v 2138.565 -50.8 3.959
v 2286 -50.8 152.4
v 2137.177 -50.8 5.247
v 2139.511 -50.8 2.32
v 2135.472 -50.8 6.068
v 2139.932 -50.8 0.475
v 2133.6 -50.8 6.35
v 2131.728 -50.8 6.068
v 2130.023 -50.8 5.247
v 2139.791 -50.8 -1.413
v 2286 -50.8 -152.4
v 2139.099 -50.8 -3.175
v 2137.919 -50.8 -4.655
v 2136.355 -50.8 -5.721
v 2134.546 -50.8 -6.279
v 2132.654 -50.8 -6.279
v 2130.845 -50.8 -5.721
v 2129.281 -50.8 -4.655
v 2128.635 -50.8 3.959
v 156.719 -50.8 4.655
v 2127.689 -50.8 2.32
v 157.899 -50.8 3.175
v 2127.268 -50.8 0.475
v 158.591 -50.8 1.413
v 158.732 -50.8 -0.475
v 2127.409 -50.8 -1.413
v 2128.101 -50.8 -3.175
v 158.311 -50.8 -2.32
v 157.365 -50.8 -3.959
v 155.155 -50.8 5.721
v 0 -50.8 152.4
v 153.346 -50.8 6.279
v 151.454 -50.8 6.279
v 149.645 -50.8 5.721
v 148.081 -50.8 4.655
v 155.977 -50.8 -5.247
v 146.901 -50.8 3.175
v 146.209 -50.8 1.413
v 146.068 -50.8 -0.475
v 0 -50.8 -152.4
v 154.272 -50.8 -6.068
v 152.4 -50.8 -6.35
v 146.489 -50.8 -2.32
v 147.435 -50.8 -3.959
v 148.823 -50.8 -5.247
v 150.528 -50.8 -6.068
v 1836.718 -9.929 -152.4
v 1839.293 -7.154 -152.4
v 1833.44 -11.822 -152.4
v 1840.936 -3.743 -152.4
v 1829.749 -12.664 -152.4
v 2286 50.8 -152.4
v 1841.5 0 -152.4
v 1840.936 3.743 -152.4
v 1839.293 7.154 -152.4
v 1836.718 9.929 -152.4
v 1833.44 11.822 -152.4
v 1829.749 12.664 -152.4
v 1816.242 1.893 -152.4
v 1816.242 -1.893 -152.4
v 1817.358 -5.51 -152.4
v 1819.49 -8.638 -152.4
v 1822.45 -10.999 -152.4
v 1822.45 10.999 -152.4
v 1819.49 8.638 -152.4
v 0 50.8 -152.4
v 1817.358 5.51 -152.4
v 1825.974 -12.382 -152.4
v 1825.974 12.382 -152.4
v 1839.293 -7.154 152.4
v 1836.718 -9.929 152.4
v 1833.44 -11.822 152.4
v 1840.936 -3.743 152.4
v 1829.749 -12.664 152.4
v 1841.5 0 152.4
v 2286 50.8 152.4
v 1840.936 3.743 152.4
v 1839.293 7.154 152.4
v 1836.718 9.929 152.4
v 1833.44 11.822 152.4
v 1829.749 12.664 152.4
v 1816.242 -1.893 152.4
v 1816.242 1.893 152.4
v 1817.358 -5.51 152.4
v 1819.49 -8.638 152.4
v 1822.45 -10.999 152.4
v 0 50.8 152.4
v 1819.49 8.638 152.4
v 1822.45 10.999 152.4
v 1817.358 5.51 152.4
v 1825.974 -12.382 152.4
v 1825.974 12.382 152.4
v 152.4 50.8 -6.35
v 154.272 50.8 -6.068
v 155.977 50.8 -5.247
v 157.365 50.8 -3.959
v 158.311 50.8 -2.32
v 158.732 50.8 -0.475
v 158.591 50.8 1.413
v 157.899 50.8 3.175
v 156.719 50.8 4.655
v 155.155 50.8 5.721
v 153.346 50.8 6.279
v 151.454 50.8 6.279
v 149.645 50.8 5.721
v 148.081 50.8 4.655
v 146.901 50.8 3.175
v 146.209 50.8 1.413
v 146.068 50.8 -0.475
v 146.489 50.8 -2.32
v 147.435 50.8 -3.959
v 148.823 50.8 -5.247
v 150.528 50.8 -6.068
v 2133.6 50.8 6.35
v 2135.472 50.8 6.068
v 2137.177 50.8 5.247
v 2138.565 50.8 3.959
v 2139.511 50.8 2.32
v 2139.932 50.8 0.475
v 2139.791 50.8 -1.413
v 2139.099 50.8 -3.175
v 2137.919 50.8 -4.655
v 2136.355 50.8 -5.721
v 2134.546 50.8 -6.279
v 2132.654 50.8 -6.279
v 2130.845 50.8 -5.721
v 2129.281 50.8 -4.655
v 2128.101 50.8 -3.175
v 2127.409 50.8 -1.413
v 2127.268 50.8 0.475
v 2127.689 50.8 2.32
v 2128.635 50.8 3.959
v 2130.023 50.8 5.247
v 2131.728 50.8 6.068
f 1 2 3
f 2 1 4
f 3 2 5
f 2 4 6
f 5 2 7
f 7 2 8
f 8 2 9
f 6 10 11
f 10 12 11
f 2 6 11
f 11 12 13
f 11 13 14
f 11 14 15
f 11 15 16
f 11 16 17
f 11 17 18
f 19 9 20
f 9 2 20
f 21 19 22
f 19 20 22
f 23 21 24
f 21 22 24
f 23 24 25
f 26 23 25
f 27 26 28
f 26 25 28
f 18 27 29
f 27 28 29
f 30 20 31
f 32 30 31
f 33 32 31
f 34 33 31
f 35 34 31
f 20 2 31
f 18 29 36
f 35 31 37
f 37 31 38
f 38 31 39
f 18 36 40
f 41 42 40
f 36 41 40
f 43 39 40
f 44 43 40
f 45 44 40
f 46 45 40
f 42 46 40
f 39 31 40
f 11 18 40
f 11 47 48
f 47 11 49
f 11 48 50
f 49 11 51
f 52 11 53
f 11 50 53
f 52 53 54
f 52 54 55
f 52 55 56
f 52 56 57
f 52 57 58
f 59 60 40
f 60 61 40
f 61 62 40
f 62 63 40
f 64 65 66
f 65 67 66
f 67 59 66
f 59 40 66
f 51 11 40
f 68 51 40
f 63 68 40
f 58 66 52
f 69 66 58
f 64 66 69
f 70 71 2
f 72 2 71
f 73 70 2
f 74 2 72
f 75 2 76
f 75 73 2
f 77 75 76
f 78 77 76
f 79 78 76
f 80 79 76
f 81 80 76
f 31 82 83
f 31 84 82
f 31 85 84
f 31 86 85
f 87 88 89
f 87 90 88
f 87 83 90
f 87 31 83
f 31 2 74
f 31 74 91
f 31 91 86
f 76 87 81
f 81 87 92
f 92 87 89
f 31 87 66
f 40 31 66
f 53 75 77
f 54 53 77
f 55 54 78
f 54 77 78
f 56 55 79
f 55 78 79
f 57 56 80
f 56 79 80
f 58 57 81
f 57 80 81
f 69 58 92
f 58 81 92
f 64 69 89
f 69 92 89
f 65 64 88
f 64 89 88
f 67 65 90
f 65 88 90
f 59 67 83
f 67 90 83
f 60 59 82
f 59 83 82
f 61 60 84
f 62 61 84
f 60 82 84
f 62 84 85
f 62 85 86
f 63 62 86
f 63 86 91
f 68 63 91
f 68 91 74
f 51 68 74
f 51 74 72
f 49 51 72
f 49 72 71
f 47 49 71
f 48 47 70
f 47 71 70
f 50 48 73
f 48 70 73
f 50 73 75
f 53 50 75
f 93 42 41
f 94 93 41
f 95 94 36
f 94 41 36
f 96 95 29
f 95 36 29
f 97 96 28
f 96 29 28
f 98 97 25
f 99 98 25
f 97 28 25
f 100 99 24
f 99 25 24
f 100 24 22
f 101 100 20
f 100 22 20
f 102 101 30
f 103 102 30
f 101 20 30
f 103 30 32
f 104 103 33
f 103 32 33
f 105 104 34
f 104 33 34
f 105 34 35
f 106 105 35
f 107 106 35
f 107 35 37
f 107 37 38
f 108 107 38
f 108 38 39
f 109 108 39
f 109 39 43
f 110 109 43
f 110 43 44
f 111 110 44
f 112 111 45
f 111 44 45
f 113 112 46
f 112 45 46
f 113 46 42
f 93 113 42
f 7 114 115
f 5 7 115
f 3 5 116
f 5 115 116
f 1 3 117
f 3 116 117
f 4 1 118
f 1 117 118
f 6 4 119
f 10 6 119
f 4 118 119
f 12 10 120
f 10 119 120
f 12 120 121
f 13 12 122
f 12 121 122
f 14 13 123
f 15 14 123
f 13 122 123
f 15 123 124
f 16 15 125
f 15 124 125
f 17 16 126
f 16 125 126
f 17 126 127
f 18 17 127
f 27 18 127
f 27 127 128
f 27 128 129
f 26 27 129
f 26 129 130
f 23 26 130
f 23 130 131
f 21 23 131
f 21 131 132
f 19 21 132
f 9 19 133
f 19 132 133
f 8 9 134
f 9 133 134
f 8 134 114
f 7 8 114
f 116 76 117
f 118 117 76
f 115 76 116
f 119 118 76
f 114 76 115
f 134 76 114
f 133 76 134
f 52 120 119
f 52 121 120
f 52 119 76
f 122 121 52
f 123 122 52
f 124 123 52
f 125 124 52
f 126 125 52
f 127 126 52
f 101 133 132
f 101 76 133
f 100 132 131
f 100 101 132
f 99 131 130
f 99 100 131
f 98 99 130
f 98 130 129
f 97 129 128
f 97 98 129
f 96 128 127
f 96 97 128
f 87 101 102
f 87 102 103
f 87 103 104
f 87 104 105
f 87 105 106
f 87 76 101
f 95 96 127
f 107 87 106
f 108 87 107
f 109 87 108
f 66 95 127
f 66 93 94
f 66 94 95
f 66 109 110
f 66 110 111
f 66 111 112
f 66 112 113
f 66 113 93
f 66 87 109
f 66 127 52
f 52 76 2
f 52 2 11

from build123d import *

# Parameters (mm, degrees)
SKETCH1_W           = 304.8
SKETCH1_H           = 101.6
BOSS_EXTRUDE1_DEPTH = 2286
SKETCH2_R           = 12.7
CUT_EXTRUDE1_DEPTH  = 304.8
SKETCH3_R           = 6.35
CUT_EXTRUDE2_DEPTH  = 101.6
SKETCH4_R           = 6.35
CUT_EXTRUDE3_DEPTH  = 101.6


with BuildPart() as part:
    # Sketch1 → Boss-Extrude1 (new body)
    with BuildSketch(Plane(origin=(0, 0, 0), x_dir=(0, 0, -1), z_dir=(1, 0, 0))):
        Rectangle(SKETCH1_W, SKETCH1_H)
    extrude(amount=BOSS_EXTRUDE1_DEPTH)

    # Sketch2 → Cut-Extrude1 (cut)
    with BuildSketch(Plane.XY.offset(152.4)):
        with Locations((1828.8, 0)):
            Circle(SKETCH2_R)
    extrude(amount=-CUT_EXTRUDE1_DEPTH, mode=Mode.SUBTRACT)

    # Sketch3 → Cut-Extrude2 (cut)
    with BuildSketch(Plane(origin=(0, 50.8, 0), x_dir=(1, 0, 0), z_dir=(0, 1, 0))):
        with Locations(Location((2133.6, 0, 0), (0, 0, 270))):
            Circle(SKETCH3_R)
    extrude(amount=-CUT_EXTRUDE2_DEPTH, mode=Mode.SUBTRACT)

    # Sketch4 → Cut-Extrude3 (cut)
    with BuildSketch(Plane.XZ.offset(50.8)):
        with Locations(Location((152.4, 0, 0), (0, 0, 270))):
            Circle(SKETCH4_R)
    extrude(amount=-CUT_EXTRUDE3_DEPTH, mode=Mode.SUBTRACT)


solid = part.part
